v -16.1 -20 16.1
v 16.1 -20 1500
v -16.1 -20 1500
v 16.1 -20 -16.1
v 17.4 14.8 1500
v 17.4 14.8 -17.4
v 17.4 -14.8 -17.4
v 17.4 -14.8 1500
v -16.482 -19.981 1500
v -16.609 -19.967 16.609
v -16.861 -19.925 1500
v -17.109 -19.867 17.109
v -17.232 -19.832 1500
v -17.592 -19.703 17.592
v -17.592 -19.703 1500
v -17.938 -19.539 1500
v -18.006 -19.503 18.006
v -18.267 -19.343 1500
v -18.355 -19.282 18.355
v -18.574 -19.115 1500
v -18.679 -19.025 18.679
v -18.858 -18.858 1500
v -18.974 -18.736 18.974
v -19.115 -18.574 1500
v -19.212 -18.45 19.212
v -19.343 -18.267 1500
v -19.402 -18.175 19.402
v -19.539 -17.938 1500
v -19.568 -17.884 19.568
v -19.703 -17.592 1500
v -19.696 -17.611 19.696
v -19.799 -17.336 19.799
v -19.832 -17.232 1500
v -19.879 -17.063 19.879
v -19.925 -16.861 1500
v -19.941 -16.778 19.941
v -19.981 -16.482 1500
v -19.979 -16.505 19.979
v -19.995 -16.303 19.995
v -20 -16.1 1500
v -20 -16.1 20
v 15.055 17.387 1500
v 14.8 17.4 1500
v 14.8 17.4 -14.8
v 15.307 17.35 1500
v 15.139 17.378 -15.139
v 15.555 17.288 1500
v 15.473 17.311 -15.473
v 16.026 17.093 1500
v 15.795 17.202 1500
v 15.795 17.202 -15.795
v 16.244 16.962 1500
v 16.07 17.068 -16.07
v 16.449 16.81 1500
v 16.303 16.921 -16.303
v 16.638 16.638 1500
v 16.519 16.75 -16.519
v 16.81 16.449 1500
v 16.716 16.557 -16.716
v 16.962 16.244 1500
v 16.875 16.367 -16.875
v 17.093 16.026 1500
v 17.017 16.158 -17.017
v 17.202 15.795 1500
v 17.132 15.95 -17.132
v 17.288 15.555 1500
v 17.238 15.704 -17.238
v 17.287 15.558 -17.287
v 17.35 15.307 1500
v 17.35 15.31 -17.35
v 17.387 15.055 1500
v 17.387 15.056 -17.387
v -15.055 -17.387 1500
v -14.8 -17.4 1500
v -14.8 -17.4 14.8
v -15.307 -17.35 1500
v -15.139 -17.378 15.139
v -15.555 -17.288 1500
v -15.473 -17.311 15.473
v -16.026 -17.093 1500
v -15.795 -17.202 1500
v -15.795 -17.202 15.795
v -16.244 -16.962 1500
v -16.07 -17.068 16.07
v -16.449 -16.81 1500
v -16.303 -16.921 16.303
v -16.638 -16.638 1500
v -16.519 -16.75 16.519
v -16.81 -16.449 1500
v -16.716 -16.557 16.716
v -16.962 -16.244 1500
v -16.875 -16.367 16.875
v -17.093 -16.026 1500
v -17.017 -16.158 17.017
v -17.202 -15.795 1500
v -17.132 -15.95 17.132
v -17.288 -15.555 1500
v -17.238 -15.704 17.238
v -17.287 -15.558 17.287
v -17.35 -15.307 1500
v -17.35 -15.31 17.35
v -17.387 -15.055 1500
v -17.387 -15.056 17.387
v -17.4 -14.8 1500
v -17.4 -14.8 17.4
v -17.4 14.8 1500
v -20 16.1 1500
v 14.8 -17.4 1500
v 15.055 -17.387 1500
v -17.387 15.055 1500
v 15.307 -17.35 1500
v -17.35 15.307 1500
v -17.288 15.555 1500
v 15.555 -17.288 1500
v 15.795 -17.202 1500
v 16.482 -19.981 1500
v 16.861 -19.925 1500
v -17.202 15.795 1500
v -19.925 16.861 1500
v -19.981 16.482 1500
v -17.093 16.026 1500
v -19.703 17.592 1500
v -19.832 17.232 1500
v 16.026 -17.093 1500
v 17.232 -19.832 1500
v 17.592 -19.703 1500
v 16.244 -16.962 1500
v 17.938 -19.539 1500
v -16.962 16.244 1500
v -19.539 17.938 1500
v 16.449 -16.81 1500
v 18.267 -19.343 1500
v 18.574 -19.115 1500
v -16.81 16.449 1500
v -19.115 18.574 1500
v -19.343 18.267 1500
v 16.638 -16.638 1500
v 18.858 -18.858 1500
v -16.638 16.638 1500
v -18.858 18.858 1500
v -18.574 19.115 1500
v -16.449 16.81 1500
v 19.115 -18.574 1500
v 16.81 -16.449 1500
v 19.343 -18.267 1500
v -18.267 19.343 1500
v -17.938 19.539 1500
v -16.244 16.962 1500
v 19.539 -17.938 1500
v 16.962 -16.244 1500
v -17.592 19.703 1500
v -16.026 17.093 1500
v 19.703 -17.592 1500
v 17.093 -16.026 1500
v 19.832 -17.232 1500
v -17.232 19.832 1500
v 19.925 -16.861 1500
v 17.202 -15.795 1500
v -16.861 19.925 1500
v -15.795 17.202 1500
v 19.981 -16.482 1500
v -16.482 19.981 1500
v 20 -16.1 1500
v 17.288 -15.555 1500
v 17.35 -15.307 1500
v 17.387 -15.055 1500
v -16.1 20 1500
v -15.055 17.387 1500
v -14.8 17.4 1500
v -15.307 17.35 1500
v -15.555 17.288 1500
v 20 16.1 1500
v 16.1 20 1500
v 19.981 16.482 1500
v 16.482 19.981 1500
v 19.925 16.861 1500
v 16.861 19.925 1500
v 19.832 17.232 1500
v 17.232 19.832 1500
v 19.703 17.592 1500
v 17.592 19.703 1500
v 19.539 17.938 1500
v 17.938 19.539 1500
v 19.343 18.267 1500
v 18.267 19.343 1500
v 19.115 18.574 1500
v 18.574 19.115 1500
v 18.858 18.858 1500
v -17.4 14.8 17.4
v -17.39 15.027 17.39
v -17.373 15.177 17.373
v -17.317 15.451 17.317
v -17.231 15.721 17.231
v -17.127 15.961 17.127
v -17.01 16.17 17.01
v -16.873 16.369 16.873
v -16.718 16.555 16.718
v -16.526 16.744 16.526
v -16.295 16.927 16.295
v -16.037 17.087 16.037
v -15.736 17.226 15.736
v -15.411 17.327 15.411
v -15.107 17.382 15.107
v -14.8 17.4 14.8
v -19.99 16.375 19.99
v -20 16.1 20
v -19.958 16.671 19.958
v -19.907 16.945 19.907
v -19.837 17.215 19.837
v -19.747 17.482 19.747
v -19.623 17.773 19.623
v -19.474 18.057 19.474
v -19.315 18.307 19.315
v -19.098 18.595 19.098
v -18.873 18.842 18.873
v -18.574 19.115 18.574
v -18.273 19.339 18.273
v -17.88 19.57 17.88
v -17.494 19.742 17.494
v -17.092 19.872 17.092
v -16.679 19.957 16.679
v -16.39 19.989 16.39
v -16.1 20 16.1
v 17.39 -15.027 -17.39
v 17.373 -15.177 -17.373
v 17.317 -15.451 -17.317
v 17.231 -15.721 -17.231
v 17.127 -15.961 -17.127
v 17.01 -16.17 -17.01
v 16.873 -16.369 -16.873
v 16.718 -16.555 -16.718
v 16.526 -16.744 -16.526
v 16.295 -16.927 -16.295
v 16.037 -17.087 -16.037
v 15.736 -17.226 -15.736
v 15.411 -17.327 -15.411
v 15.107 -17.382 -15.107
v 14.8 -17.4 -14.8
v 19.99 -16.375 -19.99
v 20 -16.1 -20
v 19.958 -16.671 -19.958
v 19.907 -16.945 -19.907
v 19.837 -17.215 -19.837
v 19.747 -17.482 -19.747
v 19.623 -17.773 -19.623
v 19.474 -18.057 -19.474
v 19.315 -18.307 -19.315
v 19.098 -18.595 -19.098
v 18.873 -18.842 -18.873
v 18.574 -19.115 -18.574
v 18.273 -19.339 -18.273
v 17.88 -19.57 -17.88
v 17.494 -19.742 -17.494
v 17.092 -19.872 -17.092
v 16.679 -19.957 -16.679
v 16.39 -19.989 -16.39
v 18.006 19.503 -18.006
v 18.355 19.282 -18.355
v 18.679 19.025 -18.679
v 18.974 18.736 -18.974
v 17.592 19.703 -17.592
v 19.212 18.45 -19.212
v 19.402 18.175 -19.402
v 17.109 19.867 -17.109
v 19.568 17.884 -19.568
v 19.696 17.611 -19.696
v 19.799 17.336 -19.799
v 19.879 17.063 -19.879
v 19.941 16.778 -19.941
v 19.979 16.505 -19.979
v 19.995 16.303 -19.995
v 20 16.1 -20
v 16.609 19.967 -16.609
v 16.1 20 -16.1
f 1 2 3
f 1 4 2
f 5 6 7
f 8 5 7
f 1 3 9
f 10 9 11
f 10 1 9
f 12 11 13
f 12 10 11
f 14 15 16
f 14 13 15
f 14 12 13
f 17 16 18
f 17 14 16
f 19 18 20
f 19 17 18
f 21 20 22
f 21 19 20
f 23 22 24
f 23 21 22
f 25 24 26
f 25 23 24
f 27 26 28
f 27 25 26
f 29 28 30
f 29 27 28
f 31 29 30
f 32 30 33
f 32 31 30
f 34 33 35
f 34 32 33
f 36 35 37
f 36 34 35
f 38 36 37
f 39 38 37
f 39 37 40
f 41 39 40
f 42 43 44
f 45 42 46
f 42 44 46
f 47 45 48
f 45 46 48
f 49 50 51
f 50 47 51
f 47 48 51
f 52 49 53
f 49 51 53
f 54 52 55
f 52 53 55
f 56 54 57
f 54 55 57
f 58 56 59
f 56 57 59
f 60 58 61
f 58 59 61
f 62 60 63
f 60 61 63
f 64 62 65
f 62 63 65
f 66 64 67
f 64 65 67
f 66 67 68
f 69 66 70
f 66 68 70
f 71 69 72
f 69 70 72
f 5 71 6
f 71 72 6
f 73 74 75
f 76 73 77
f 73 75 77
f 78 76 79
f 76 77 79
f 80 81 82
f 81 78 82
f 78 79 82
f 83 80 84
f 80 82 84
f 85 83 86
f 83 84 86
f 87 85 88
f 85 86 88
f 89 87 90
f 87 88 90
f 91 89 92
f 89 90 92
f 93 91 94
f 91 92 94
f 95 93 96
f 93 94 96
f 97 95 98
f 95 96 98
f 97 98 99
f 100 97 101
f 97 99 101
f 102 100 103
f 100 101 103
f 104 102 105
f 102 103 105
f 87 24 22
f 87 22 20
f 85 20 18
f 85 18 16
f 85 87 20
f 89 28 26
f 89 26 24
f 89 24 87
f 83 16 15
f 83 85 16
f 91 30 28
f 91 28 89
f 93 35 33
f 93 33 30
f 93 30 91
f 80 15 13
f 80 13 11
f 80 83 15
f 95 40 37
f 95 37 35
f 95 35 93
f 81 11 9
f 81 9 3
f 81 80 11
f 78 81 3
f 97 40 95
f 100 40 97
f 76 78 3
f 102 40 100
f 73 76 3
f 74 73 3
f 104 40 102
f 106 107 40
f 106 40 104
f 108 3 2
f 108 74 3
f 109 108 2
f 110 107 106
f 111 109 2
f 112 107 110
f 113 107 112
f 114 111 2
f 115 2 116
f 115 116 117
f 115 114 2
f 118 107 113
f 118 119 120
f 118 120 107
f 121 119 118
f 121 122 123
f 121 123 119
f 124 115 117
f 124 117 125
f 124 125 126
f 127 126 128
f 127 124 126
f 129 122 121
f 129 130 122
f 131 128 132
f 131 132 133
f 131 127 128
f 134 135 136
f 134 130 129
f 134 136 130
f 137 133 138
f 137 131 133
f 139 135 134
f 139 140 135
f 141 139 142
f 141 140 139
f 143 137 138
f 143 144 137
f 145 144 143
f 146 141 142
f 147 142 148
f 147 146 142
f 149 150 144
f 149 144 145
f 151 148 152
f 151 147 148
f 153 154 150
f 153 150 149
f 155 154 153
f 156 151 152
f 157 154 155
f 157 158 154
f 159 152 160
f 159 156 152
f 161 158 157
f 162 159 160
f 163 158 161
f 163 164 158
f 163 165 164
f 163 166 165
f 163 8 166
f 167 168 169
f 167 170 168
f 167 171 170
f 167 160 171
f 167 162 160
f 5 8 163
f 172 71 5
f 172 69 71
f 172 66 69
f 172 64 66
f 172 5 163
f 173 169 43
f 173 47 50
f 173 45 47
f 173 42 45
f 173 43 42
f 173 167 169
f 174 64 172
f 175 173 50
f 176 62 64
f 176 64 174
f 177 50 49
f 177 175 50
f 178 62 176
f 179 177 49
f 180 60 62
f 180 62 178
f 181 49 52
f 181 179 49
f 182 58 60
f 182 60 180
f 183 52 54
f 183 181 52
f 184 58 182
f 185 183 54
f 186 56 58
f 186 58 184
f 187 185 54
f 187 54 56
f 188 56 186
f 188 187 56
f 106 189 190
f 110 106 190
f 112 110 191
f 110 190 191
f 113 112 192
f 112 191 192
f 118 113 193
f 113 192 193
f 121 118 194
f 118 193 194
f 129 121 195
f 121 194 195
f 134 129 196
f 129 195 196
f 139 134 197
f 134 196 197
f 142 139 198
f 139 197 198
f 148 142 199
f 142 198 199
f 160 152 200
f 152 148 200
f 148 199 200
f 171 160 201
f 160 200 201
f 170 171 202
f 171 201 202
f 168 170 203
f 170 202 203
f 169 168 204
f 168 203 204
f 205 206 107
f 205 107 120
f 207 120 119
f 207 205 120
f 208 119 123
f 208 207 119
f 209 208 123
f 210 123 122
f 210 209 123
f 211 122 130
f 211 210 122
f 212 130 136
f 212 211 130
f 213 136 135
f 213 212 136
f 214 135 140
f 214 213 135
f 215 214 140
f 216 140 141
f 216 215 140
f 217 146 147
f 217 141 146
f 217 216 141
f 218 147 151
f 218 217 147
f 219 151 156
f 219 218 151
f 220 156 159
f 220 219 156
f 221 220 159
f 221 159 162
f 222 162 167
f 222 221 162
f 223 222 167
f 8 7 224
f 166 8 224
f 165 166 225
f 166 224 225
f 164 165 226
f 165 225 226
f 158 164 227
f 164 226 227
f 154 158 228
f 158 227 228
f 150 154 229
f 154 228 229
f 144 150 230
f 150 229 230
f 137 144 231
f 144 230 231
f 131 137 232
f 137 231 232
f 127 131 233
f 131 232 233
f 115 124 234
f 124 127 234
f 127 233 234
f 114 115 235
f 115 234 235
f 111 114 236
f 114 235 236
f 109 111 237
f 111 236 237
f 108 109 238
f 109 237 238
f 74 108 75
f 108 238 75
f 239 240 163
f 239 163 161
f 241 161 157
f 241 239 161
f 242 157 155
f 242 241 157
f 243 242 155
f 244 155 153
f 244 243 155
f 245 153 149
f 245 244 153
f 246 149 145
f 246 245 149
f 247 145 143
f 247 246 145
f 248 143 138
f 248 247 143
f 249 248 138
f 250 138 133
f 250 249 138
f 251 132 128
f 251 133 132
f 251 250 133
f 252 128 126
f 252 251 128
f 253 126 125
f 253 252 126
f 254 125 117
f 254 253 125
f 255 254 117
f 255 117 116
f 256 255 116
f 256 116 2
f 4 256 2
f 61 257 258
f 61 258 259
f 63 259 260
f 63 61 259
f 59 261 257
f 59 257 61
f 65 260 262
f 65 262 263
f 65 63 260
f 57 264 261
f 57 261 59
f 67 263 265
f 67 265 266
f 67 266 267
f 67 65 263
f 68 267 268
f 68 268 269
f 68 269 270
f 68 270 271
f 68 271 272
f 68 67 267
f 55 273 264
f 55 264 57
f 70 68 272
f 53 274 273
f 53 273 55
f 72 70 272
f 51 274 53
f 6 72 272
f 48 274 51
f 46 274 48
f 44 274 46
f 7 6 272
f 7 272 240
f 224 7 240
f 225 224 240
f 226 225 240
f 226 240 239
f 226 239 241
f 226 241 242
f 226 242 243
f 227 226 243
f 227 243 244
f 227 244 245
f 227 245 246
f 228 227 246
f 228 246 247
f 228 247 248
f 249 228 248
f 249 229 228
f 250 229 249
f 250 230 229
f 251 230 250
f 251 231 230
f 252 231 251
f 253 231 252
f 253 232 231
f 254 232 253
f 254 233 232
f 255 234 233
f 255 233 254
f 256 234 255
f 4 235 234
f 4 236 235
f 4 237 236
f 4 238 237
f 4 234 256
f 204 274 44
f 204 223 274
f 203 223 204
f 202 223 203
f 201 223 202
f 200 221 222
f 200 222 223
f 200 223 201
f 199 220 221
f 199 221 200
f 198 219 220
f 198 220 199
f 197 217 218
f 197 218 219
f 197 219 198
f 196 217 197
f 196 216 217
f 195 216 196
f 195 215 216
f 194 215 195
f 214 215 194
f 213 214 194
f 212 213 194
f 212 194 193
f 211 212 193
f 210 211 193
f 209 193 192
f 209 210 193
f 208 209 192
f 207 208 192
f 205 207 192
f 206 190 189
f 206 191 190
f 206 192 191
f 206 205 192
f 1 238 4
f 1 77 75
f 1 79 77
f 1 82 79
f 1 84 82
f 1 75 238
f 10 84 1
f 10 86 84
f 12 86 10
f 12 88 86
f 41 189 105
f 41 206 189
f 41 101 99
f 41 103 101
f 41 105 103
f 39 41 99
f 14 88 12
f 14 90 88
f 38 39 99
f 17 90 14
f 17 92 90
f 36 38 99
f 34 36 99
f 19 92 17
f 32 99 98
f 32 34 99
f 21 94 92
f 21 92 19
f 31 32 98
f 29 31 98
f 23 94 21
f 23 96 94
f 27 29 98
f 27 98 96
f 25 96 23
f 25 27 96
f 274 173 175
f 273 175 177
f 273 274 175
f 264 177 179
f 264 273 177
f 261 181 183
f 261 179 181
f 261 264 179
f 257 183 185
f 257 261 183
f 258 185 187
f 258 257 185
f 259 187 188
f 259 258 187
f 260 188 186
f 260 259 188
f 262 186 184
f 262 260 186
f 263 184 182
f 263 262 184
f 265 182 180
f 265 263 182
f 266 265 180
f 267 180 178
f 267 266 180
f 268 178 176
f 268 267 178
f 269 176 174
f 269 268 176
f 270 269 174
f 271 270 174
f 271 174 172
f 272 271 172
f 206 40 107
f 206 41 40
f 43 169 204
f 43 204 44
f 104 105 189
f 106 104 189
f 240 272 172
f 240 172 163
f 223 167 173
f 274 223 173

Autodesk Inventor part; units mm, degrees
ref_plane "Start plane" through (0, 0, -20) normal (0, 0, 1) x (1, 0, 0)
ref_plane "End plane" through (0, 0, 1500) normal (0, 0, 1) x (1, 0, 0)
sketch "Sketch" plane through (0, 0, 0) normal (0, 0, 1) x (1, 0, 0)
  line L0 (-20, -16.1) -> (-20, 16.1)
  line L1 (-16.1, 20) -> (16.1, 20)
  line L2 (20, 16.1) -> (20, -16.1)
  line L3 (16.1, -20) -> (-16.1, -20)
  arc A0 (-20, -16.1) -> (-16.1, -20) centre (-16.1, -16.1) ccw
  arc A1 (-16.1, 20) -> (-20, 16.1) centre (-16.1, 16.1) ccw
  arc A2 (20, 16.1) -> (16.1, 20) centre (16.1, 16.1) ccw
  arc A3 (16.1, -20) -> (20, -16.1) centre (16.1, -16.1) ccw
  line L4 (-14.8, 17.4) -> (14.8, 17.4)
  line L5 (17.4, 14.8) -> (17.4, -14.8)
  line L6 (14.8, -17.4) -> (-14.8, -17.4)
  line L7 (-17.4, -14.8) -> (-17.4, 14.8)
  line L8 (0, 29.1308) -> (0, -29.1308) construction
  line L9 (-29.1308, 0) -> (29.1308, 0) construction
  arc A4 (-17.4, -14.8) -> (-14.8, -17.4) centre (-14.8, -14.8) ccw
  arc A5 (-14.8, 17.4) -> (-17.4, 14.8) centre (-14.8, 14.8) ccw
  arc A6 (17.4, 14.8) -> (14.8, 17.4) centre (14.8, 14.8) ccw
  arc A7 (14.8, -17.4) -> (17.4, -14.8) centre (14.8, -14.8) ccw
  dimension "d7" = 3.9
  dimension "d10" = 40
  dimension "d11" = 40
  dimension "d12" = 2.6
  dimension "d15" = 20
  dimension "d16" = 20
  dimension "d19" = 2.6
  dimension "d20" = 2.6
extrude "Body" add sketch "Sketch" along normal up to surface (1520 mm away) from surface at -20
sketch "Sketch3" plane through (0, 0, 0) normal (0, 0, 1) x (1, 0, 0)
  line L0 (0, 0) -> (10, 0)
ref_plane "Work Plane3" through (0, 0, 0) normal (0, -1, 0) x (1, 0, 0)
sketch "Sketch4" plane through (0, 0, 0) normal (0, -1, 0) x (1, 0, 0)
  line L0 (-2, -20) -> (12, -20)
  line L1 (-2, 1500) -> (12, 1500)
  dimension "d18" = 1520
ref_plane "Work Plane4" through (20, 0, -20) normal (-0.7071, 0, -0.7071) x (-0.7071, 0, 0.7071)
split "Split1" plane through (20, 0, -20) removes the side toward (-0.7071, 0, -0.7071)
equation "\"d7\" = G_IR"
equation "\"d10\" = G_H"
equation "\"d11\" = G_W"
equation "\"d12\" = G_T"
equation "\"d15\" = 0.5 * d10"
equation "\"d16\" = 0.5 * d11"
equation "\"d19\" = G_T"
equation "\"d20\" = G_T"
equation "\"d3\" = G_L"
equation "\"G_W\" = 40"
equation "\"G_H\" = 40"
equation "\"G_T\" = 2.6"
equation "\"G_IR\" = 3.9"
equation "\"G_L\" = d18"
equation "\"G_OFFSET_END\" = 0"
properties part number "EN 10210-2 - 40 x 40 x 2.6 - 1520" material "Steel, Galvanized"
